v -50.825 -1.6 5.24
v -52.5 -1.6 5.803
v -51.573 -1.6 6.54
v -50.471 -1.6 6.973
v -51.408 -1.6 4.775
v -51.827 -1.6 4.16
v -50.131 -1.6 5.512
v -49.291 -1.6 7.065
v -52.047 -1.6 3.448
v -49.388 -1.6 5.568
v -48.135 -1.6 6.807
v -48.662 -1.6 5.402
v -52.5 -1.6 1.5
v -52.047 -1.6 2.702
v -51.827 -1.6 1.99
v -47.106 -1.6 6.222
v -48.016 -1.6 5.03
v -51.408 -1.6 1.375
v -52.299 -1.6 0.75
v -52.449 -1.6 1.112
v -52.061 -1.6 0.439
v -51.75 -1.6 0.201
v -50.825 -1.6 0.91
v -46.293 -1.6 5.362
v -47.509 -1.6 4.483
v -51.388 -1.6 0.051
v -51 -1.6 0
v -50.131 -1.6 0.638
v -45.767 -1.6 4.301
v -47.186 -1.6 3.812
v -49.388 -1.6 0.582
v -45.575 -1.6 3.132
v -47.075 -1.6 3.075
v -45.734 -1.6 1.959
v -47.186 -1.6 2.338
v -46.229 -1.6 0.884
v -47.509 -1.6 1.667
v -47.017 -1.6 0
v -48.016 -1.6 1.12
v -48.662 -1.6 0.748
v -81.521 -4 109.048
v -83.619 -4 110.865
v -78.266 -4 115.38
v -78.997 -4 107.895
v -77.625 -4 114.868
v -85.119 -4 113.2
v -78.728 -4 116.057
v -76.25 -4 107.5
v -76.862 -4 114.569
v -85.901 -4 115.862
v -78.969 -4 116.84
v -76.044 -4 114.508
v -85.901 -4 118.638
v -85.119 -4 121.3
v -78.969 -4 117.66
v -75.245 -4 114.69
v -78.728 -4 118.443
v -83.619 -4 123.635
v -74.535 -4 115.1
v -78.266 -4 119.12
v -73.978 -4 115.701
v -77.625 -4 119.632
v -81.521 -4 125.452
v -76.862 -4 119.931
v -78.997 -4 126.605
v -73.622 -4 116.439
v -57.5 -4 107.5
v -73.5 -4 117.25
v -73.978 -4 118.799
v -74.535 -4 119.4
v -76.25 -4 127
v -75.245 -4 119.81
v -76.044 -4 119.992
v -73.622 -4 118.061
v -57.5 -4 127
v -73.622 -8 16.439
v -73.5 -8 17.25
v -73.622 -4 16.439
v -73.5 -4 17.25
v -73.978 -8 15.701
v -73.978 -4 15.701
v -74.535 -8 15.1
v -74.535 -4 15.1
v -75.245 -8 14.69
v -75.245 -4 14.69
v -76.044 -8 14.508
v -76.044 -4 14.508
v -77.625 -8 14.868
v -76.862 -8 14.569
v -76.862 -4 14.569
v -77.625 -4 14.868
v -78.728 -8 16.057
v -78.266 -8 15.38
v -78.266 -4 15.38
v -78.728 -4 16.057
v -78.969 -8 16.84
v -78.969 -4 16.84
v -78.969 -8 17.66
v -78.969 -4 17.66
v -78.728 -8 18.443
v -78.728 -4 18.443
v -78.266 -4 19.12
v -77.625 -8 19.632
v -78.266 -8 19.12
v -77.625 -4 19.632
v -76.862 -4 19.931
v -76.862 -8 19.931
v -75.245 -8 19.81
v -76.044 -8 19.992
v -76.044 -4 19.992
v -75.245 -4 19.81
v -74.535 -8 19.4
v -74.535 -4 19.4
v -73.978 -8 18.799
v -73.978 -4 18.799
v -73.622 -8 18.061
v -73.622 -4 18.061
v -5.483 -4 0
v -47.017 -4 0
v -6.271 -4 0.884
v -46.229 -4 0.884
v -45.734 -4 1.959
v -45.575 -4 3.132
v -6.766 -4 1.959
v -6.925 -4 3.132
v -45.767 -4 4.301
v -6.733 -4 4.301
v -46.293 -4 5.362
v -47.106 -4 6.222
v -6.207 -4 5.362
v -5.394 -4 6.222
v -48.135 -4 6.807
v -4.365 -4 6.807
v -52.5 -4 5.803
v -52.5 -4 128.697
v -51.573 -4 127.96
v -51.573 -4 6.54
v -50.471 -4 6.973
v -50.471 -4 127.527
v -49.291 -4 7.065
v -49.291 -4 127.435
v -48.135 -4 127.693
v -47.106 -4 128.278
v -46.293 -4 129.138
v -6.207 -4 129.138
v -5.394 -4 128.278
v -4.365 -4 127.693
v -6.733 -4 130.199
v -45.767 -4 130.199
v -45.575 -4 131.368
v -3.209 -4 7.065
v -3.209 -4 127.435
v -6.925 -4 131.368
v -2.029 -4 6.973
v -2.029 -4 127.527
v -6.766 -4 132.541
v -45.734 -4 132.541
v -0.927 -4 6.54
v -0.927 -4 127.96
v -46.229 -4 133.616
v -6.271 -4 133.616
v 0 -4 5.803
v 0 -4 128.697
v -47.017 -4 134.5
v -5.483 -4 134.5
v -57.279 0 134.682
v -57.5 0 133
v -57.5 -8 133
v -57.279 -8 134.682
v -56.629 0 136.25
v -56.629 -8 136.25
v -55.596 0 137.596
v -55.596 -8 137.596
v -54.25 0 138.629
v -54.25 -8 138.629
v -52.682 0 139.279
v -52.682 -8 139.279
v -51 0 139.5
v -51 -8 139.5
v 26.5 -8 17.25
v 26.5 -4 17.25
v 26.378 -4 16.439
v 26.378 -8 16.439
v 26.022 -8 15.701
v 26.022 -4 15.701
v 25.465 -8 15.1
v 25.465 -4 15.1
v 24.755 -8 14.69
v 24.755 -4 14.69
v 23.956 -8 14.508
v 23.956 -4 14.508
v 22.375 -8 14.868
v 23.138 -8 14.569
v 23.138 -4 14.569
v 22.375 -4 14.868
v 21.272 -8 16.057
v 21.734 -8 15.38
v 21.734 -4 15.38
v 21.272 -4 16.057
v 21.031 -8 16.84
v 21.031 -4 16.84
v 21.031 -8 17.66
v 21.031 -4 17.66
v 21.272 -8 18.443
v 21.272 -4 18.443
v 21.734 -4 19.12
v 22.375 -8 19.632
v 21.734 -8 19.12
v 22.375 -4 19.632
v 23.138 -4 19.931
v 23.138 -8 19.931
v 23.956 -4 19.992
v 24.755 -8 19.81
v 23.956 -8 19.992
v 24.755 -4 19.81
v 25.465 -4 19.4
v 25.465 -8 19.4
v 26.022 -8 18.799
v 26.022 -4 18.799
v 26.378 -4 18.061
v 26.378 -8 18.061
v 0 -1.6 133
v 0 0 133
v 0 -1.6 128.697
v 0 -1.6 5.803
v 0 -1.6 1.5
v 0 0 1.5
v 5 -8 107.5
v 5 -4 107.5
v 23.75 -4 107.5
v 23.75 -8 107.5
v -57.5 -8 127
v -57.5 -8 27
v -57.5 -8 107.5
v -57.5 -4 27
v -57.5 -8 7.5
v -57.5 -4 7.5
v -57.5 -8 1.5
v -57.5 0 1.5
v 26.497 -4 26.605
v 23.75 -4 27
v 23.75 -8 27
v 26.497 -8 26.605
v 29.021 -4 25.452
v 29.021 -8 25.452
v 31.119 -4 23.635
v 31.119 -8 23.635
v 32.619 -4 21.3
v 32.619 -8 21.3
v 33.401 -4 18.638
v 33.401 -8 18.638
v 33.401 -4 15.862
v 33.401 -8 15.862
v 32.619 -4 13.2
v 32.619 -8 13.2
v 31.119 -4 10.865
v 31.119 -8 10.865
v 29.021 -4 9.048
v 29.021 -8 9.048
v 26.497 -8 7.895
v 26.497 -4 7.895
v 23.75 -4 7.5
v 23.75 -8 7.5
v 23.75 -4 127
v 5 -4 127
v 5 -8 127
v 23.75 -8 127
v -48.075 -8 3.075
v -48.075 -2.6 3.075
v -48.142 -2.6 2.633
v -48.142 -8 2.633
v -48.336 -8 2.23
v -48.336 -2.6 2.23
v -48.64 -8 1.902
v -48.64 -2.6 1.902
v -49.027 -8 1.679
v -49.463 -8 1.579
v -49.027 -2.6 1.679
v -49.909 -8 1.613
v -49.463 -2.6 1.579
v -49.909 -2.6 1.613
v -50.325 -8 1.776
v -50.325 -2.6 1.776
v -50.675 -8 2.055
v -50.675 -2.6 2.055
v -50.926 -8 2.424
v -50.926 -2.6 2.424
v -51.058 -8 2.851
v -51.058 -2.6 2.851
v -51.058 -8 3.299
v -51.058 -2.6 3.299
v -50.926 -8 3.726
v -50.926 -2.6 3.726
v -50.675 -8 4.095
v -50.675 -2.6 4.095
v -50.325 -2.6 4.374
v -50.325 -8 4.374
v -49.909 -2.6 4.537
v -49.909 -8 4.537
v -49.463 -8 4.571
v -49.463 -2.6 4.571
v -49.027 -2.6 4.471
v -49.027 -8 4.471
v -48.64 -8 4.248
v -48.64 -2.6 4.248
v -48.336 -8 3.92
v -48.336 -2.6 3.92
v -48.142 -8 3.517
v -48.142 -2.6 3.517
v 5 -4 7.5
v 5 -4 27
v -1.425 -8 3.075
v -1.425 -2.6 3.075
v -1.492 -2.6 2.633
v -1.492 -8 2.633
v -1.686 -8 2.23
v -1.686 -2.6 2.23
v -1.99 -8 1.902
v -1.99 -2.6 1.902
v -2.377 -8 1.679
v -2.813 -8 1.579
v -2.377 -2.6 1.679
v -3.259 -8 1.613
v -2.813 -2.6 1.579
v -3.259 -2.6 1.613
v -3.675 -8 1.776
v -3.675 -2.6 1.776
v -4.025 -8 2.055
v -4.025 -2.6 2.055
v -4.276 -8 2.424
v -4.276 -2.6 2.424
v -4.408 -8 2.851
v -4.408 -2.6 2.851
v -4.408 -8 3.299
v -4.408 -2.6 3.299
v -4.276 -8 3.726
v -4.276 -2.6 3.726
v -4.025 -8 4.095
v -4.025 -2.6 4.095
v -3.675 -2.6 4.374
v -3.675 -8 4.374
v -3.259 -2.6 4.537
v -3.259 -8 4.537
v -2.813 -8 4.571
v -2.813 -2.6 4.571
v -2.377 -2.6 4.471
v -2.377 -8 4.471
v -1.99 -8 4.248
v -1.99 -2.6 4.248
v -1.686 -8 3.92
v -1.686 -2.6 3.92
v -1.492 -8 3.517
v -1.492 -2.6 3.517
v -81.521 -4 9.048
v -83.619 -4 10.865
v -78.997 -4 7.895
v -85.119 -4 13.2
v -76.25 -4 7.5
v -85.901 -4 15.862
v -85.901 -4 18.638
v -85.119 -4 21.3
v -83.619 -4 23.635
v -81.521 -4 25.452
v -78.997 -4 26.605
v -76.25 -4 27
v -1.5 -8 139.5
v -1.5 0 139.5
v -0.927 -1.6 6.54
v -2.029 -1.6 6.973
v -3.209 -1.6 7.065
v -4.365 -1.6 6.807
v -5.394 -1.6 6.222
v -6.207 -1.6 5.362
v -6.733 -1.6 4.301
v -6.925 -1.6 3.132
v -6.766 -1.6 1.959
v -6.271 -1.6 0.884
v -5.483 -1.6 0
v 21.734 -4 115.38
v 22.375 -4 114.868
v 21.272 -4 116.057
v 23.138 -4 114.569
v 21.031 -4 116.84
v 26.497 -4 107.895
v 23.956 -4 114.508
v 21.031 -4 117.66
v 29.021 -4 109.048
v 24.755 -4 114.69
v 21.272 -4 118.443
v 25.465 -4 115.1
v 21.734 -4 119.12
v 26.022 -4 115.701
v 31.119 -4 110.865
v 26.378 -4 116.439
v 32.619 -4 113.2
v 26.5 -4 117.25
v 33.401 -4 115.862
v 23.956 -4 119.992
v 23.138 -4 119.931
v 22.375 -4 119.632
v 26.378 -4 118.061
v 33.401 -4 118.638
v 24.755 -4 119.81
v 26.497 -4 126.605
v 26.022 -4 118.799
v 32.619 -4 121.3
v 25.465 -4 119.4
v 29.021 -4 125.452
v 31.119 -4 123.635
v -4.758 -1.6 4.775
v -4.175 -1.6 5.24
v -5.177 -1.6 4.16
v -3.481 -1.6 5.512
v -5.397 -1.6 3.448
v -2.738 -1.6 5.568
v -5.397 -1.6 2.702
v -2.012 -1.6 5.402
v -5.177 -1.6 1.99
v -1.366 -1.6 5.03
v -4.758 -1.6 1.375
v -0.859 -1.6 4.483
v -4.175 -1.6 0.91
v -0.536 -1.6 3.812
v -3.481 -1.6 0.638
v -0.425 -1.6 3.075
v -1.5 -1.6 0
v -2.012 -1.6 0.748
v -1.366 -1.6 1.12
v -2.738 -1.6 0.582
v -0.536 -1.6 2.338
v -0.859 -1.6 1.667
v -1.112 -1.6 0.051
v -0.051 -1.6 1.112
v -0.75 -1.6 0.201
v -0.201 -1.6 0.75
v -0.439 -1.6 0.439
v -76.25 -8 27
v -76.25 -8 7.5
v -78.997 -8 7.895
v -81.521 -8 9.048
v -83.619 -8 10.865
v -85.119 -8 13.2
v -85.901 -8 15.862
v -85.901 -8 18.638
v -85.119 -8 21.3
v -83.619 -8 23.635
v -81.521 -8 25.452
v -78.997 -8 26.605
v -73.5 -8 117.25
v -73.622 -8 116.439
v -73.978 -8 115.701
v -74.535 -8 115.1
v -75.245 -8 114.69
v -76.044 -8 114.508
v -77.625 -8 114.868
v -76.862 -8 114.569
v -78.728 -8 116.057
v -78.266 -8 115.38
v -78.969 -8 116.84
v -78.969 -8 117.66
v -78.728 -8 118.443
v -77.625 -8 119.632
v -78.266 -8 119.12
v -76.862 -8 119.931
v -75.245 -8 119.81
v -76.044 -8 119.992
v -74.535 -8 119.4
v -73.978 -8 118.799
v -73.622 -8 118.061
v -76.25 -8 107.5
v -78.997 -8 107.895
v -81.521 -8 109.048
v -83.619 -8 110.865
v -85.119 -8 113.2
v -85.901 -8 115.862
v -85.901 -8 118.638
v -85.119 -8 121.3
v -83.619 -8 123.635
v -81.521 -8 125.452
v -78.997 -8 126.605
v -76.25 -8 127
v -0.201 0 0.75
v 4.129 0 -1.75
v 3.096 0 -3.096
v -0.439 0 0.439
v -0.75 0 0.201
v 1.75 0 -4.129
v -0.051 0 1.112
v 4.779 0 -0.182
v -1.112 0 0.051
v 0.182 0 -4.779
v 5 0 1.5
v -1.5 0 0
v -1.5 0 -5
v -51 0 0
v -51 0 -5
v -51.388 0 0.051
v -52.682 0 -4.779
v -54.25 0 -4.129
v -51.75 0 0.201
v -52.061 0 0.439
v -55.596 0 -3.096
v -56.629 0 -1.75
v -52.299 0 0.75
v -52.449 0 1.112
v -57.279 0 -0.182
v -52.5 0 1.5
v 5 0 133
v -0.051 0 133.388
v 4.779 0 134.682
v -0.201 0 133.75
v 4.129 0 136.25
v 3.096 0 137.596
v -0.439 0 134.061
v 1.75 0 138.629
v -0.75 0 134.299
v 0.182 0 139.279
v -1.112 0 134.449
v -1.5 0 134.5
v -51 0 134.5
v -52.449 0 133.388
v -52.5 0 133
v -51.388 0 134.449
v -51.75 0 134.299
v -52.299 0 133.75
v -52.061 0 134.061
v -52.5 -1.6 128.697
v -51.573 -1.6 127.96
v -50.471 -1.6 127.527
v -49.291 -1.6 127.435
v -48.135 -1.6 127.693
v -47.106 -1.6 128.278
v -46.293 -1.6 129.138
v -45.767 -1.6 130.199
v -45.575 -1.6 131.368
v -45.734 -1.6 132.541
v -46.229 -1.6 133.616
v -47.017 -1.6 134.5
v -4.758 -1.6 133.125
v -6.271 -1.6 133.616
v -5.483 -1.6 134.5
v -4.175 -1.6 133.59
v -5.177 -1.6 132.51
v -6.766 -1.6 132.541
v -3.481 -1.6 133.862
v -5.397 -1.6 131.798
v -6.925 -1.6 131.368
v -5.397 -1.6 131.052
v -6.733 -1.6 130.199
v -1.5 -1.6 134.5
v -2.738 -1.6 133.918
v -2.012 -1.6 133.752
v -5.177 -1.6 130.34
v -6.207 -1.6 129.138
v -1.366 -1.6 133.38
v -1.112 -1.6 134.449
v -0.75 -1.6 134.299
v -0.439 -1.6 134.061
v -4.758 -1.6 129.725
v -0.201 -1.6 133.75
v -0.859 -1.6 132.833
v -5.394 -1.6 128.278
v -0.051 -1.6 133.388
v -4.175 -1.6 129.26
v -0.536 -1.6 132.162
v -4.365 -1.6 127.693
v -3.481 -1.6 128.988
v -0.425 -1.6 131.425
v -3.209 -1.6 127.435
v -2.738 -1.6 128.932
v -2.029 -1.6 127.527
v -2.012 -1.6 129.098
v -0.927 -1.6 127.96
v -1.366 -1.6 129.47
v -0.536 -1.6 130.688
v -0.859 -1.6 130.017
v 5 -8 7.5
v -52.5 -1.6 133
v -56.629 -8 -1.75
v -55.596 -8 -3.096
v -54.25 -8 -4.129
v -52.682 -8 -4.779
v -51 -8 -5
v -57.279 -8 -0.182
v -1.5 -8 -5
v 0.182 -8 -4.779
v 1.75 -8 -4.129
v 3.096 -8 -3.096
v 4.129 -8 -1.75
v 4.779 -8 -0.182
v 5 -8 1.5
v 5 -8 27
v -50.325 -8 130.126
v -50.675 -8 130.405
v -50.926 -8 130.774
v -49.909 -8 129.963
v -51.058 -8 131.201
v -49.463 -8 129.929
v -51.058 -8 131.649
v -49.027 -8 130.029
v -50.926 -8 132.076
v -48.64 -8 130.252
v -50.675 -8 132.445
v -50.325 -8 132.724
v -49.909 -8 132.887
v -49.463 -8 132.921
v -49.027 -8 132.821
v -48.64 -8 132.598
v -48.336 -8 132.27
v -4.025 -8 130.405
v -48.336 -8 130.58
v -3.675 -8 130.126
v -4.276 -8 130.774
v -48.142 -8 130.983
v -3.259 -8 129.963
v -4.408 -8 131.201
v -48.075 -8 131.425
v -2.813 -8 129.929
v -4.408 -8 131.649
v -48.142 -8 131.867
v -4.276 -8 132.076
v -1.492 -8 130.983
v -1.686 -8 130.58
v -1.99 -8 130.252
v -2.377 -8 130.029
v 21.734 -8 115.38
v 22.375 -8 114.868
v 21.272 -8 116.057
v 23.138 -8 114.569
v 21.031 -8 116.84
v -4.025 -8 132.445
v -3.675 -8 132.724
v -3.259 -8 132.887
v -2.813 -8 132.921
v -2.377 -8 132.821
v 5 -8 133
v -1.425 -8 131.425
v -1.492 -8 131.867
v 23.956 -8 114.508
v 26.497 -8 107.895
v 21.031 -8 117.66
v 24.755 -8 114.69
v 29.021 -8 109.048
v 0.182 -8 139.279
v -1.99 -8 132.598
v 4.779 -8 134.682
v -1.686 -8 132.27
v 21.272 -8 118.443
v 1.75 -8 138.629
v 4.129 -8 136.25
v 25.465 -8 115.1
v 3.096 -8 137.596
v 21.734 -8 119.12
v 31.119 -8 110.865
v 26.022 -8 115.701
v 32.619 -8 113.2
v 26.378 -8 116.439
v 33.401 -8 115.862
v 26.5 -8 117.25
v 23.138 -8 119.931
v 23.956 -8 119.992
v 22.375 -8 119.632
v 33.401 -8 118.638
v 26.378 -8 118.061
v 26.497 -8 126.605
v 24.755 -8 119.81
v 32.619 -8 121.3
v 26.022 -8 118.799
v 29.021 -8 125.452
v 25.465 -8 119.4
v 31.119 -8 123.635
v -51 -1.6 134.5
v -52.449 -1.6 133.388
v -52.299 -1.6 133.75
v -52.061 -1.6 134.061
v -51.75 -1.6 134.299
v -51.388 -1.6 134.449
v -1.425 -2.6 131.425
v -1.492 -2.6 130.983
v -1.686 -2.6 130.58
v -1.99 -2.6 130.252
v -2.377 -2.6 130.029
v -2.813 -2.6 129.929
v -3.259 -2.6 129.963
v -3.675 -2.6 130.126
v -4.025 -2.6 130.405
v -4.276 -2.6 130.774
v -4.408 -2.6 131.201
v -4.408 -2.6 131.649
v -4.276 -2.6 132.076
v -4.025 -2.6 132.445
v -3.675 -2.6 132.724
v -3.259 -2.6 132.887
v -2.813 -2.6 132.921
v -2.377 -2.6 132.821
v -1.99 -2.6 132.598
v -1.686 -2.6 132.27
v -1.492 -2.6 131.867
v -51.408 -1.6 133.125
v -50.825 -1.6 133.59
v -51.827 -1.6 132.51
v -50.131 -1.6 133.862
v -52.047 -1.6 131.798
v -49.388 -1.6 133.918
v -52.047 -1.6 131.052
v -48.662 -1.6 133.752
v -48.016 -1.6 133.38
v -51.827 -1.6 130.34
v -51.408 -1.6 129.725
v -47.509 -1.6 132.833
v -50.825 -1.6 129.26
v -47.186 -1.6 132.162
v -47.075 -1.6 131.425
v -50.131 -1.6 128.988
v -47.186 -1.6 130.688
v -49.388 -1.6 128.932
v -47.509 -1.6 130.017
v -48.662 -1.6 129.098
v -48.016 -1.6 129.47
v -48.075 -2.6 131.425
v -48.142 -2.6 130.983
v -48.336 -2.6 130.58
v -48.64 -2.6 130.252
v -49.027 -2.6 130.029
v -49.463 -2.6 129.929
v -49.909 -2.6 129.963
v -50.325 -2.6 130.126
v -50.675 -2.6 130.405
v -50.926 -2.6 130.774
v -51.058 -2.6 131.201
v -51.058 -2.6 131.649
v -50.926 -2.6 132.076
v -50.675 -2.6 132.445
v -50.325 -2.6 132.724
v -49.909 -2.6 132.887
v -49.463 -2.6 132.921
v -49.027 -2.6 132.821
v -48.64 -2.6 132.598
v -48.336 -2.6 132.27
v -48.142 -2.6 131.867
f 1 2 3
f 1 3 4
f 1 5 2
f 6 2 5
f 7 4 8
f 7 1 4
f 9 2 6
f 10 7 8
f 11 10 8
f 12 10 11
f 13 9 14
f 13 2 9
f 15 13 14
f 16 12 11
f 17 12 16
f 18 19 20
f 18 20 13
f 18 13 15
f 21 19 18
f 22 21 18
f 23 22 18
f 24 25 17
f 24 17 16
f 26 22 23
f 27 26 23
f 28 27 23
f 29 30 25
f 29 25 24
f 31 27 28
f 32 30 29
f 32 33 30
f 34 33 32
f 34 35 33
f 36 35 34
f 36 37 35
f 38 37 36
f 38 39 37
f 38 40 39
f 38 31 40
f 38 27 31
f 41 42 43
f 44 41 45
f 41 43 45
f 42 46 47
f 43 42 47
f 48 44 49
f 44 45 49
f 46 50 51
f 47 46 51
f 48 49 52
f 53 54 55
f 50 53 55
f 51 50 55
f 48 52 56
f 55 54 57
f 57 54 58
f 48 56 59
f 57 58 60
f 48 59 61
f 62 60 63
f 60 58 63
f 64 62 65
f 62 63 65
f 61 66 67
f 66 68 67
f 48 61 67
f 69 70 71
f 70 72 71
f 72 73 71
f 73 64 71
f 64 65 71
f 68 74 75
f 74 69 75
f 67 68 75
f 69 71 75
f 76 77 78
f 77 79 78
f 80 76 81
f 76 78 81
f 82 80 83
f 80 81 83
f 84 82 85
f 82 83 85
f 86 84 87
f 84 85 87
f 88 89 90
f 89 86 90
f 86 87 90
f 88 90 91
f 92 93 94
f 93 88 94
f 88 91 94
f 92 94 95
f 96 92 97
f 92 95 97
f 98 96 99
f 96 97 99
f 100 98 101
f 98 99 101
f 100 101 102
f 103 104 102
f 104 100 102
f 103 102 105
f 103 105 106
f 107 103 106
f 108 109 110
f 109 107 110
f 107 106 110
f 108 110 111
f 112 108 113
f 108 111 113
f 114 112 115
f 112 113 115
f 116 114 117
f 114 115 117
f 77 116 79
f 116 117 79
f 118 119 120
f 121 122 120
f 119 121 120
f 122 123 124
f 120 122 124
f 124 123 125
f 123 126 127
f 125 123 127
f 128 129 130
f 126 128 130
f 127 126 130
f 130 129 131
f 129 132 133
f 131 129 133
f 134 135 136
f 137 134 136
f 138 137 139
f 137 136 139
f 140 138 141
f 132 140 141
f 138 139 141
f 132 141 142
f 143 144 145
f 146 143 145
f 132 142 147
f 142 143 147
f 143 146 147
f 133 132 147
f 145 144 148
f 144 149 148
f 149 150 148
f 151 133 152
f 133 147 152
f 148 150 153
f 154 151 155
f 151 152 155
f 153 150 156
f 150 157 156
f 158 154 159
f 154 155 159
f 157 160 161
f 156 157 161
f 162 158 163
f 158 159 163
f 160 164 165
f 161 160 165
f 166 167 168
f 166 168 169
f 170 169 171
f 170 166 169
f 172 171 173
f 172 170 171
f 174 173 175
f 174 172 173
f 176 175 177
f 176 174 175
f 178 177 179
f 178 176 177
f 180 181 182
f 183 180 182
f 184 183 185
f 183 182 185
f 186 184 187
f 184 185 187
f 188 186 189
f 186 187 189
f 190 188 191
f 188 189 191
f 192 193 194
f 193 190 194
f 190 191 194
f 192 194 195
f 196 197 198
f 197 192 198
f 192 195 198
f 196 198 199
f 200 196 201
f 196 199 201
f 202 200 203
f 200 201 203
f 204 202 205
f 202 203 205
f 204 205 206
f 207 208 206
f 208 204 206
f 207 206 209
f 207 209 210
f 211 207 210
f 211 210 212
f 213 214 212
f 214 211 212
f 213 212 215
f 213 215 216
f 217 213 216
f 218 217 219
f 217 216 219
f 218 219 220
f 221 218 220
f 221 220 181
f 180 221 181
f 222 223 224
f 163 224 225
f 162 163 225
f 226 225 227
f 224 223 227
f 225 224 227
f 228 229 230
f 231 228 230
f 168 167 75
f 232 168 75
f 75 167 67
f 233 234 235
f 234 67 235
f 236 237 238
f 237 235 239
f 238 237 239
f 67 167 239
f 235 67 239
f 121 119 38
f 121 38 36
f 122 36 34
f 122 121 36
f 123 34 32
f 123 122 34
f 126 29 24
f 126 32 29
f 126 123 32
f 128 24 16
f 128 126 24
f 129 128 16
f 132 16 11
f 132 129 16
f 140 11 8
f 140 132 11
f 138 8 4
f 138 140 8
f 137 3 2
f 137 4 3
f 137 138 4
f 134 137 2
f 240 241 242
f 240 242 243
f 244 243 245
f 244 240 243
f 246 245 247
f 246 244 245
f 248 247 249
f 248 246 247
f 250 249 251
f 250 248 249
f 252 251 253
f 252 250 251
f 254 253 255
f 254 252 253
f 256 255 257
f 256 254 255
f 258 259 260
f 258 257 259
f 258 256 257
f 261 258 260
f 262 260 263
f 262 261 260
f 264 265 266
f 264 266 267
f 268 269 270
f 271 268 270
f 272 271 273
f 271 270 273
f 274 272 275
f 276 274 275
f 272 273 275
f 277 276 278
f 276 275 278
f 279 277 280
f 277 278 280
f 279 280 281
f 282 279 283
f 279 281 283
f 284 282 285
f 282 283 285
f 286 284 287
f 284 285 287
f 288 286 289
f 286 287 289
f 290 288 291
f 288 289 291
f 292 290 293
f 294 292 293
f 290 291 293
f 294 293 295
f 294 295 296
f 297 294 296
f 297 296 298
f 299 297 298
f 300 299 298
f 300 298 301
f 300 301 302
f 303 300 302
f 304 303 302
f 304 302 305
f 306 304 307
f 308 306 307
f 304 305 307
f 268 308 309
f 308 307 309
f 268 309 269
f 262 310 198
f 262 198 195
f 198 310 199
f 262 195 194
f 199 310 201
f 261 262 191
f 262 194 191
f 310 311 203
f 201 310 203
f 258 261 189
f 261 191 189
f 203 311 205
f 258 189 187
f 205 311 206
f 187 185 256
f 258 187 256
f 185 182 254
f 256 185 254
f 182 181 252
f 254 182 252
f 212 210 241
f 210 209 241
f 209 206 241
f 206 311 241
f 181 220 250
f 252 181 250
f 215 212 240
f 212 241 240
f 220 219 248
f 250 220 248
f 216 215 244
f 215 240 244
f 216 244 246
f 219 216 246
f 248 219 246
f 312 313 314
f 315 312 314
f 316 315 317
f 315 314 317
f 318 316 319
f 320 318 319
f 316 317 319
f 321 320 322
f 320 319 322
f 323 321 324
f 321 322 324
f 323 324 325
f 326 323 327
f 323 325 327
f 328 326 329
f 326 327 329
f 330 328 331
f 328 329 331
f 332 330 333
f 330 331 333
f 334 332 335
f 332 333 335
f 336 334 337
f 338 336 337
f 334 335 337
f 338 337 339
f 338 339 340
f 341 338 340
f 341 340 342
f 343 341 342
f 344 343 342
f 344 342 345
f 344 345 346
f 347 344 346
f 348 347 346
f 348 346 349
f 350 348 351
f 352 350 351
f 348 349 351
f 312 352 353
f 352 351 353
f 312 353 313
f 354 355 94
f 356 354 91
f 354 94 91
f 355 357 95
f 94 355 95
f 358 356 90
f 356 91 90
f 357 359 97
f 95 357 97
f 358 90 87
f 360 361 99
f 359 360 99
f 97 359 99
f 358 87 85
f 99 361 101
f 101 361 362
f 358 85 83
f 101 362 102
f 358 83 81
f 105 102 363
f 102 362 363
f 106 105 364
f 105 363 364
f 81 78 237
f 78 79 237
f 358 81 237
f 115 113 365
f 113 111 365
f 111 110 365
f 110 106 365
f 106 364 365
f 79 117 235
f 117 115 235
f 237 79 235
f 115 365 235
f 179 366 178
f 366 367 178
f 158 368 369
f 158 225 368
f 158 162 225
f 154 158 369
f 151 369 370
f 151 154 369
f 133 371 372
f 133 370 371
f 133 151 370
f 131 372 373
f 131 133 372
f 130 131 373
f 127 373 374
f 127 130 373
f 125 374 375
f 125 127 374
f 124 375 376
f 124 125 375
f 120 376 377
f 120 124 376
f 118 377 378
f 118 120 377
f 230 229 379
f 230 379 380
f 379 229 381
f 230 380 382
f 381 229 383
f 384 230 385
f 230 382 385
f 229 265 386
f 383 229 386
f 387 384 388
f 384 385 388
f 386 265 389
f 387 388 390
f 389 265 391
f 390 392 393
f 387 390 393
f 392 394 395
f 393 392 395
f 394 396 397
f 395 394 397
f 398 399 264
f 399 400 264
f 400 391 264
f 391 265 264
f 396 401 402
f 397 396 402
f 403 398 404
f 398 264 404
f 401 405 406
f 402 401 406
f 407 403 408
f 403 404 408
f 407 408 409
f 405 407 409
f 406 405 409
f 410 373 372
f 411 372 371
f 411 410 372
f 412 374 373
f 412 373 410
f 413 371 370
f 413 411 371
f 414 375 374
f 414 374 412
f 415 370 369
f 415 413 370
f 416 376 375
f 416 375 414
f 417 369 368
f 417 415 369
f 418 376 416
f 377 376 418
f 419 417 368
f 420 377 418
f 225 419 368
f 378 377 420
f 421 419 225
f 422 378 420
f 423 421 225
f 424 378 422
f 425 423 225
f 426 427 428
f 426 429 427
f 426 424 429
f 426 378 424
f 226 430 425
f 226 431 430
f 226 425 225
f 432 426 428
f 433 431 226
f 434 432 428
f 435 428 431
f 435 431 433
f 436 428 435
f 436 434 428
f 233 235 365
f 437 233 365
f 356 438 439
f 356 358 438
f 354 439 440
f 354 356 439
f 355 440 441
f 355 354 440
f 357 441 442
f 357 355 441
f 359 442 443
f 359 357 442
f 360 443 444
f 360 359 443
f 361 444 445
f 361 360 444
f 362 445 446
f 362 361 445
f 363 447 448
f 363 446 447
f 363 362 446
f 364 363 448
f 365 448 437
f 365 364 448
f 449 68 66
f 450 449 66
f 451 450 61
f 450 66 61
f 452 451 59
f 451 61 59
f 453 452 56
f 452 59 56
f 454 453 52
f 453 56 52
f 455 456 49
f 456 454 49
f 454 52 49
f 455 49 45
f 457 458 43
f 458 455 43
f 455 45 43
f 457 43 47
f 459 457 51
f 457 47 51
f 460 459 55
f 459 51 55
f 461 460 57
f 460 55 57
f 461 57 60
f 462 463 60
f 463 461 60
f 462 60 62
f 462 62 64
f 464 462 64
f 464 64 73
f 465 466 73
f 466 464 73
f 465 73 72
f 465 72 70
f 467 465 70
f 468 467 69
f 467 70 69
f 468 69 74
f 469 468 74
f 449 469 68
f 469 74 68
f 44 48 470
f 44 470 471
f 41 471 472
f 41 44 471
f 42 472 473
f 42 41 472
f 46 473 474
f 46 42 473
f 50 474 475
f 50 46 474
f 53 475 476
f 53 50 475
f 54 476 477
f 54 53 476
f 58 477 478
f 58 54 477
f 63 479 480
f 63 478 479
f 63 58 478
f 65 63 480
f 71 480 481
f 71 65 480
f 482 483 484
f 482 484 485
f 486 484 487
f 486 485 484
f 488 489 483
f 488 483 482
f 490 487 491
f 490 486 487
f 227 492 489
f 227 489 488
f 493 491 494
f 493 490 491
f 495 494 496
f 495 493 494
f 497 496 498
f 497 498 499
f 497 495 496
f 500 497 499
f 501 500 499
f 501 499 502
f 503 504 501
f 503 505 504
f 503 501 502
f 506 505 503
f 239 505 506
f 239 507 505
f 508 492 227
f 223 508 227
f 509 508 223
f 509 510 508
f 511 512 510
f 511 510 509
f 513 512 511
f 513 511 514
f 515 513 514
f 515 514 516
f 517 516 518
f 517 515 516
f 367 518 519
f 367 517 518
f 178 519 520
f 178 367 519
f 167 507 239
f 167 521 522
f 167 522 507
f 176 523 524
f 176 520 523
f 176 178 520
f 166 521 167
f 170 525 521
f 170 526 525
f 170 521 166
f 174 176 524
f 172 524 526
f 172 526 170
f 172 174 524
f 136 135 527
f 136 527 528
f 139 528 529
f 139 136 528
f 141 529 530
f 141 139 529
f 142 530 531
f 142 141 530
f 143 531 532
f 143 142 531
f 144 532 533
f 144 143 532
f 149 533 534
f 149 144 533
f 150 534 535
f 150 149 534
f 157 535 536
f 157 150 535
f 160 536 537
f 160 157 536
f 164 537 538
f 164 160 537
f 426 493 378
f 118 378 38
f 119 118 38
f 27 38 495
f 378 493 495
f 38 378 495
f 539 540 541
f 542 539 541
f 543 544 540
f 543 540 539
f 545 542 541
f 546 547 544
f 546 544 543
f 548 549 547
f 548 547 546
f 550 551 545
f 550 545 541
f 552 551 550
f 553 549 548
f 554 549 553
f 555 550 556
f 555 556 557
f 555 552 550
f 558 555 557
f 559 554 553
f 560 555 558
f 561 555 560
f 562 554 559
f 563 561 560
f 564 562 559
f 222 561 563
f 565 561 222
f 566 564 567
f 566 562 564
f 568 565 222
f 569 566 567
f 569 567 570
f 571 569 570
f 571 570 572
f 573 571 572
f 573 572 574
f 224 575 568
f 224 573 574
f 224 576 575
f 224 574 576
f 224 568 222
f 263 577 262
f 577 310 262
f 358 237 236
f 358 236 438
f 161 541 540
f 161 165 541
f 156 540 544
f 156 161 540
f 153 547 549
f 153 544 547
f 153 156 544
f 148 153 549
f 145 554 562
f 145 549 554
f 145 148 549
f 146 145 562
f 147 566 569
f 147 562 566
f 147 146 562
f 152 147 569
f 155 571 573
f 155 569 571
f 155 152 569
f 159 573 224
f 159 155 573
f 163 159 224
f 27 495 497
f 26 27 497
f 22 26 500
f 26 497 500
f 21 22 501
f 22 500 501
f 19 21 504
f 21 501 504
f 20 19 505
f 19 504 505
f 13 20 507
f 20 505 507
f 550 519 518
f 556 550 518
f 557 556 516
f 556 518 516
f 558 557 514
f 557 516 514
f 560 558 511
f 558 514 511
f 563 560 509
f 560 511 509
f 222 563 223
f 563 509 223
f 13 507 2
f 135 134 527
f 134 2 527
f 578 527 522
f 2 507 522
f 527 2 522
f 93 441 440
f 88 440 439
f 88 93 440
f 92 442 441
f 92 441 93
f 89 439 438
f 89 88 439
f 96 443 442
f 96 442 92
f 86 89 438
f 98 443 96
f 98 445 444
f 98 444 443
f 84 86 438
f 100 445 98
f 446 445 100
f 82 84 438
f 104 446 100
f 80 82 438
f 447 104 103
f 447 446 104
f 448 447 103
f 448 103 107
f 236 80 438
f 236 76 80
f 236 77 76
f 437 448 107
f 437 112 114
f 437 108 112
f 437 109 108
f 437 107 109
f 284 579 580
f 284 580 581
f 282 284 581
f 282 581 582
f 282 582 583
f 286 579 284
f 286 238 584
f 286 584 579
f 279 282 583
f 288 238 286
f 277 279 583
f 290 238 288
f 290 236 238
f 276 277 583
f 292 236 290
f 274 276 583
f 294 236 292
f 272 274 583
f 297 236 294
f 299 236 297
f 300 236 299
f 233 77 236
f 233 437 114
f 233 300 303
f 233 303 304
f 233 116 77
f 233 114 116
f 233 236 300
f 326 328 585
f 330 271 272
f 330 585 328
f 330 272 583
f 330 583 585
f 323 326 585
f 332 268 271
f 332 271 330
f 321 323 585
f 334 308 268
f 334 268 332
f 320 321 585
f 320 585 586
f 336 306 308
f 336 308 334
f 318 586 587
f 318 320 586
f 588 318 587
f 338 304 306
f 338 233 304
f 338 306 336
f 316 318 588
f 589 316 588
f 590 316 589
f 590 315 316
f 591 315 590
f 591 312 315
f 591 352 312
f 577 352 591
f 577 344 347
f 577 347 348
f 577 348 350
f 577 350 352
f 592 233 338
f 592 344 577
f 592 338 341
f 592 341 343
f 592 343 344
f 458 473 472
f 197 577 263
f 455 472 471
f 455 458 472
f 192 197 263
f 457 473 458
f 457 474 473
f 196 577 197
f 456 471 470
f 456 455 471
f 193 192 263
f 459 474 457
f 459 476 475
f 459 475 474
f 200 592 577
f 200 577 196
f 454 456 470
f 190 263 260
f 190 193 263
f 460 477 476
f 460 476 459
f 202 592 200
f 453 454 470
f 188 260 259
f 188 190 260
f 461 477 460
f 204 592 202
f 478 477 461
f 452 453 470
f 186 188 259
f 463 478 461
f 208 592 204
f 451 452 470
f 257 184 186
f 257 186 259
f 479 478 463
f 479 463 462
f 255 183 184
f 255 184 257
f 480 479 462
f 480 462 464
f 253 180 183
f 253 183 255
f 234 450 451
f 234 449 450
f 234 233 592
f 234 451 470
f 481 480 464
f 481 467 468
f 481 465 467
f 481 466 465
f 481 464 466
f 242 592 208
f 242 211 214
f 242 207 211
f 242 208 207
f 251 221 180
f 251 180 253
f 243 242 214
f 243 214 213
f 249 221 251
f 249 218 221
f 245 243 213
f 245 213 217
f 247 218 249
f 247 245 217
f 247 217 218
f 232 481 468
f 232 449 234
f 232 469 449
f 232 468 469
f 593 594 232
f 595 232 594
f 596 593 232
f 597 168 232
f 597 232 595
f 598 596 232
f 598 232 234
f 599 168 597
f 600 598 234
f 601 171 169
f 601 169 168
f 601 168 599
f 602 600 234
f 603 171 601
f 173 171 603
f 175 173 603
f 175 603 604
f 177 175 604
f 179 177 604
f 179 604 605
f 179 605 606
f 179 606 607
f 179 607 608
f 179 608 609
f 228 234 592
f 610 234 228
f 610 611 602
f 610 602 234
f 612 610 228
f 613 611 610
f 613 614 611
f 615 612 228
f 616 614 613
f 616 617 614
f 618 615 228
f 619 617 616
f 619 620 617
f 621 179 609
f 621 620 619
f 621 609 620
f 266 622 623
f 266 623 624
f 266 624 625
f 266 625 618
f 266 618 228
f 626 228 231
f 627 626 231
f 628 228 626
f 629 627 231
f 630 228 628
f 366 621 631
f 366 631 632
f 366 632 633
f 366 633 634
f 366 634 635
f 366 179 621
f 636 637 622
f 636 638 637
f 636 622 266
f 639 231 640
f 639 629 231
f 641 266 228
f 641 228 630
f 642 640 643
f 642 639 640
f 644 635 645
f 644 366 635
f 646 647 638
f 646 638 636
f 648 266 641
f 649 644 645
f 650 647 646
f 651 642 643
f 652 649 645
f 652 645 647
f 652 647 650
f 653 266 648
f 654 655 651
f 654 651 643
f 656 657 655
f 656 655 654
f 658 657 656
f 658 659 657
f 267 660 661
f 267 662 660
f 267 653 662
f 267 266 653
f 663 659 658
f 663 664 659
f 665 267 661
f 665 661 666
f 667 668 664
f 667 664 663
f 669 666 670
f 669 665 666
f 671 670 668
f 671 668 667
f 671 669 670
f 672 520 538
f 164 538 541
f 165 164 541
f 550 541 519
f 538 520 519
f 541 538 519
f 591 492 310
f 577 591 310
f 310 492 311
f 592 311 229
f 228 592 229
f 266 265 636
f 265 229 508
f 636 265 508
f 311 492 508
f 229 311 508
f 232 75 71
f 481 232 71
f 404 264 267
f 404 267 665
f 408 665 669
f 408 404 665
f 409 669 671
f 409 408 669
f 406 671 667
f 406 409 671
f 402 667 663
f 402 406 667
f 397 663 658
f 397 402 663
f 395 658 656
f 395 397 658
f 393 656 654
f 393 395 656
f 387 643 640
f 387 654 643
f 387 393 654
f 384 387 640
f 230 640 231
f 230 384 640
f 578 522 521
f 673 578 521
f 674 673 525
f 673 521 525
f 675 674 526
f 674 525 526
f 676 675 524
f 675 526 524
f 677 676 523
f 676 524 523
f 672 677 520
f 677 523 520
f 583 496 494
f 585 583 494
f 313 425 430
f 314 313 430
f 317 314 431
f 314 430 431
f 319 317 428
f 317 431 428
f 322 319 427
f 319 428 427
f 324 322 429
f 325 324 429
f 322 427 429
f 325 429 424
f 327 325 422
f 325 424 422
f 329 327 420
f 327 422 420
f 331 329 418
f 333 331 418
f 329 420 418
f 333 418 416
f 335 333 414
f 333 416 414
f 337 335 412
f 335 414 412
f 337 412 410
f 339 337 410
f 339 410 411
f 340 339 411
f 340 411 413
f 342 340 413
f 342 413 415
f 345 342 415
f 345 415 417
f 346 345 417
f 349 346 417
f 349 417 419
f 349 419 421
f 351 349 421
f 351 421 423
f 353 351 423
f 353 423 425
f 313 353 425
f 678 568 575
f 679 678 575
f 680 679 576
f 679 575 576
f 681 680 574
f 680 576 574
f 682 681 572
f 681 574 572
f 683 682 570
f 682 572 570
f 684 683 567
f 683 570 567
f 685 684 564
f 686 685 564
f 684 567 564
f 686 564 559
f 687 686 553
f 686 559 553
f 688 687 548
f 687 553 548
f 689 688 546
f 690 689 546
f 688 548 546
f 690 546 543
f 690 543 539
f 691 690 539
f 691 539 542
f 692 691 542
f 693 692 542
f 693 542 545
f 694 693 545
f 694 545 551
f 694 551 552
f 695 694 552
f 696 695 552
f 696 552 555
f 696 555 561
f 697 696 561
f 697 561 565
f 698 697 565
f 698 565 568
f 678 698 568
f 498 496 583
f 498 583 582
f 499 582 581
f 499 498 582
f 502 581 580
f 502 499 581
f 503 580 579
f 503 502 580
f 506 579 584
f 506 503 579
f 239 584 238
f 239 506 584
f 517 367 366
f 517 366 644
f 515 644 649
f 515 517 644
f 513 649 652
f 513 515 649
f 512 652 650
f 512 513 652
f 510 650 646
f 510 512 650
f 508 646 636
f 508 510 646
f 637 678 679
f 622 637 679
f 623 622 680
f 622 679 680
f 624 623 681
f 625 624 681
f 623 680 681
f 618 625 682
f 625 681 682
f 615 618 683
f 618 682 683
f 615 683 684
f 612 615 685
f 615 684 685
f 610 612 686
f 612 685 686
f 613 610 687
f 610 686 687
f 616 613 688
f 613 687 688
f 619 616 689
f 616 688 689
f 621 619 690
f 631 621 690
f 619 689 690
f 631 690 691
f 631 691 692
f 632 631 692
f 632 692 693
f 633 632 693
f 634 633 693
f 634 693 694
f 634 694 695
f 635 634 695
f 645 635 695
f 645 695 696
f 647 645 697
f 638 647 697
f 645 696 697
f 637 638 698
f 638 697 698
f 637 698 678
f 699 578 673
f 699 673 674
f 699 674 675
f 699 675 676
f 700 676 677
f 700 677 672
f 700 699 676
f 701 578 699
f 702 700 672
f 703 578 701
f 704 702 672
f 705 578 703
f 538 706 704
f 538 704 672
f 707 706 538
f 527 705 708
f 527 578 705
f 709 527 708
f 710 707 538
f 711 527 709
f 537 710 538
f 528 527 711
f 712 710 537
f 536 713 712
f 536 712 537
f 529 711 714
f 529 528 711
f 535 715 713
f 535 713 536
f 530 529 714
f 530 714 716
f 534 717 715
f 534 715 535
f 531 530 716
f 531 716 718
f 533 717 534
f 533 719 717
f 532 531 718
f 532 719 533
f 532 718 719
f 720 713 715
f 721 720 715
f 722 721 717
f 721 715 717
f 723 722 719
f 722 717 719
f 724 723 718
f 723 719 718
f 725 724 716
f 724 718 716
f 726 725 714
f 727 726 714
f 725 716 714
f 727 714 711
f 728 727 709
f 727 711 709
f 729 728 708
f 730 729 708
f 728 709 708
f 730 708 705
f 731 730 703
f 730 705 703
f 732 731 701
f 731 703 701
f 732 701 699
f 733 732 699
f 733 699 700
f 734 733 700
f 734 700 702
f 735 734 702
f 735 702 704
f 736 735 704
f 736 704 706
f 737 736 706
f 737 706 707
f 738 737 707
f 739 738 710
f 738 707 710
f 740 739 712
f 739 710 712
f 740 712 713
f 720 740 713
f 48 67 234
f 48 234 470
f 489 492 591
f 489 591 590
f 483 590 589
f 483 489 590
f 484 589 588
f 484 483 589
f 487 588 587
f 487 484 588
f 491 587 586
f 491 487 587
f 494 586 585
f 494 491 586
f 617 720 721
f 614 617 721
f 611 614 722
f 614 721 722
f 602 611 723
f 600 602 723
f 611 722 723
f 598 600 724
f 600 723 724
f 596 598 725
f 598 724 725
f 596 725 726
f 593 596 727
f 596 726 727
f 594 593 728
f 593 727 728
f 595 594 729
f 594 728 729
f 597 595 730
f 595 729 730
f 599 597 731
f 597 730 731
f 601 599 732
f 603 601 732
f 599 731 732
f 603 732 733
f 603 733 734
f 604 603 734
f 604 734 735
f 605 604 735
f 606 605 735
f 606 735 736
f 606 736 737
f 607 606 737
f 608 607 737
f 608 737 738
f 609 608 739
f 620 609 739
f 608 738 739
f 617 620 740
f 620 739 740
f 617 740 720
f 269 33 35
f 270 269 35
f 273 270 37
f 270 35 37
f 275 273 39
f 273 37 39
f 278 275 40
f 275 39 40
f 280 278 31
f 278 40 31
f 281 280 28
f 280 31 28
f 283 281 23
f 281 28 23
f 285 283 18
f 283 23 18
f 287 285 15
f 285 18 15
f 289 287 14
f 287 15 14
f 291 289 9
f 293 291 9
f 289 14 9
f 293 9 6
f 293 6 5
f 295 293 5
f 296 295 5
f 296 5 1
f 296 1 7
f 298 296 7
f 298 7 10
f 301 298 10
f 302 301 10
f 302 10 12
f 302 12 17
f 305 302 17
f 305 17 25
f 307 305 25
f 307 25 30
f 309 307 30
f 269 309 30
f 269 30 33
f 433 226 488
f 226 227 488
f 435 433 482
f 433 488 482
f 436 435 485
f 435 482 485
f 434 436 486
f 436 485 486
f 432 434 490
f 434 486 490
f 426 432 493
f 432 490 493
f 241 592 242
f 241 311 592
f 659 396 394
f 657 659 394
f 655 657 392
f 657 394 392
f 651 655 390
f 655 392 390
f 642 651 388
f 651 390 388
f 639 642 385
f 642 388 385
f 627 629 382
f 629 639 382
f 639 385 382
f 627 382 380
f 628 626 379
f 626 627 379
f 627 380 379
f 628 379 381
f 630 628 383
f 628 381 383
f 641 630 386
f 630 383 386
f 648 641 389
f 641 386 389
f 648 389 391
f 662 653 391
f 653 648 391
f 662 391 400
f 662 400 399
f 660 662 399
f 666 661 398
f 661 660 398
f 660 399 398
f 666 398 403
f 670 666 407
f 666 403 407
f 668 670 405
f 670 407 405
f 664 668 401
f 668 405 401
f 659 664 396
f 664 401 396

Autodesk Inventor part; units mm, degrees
ref_plane "YZ Plane" through (0, 0, 0) normal (1, 0, 0) x (0, 1, 0)
ref_plane "XZ Plane" through (0, 0, 0) normal (0, 1, 0) x (-1, 0, 0)
ref_plane "XY Plane" through (0, 0, 0) normal (0, 0, 1) x (1, 0, 0)
sketch "Sketch1" plane through (0, 0, 0) normal (0, 1, 0) x (-1, 0, 0)
  line L0 (1.5, 0) -> (51, 0)
  line L1 (52.5, 1.5) -> (52.5, 133)
  line L2 (51, 134.5) -> (1.5, 134.5)
  line L3 (0, 133) -> (0, 1.5)
  arc A0 (52.5, 133) -> (51, 134.5) centre (51, 133) ccw
  arc A1 (51, 0) -> (52.5, 1.5) centre (51, 1.5) ccw
  arc A2 (0, 1.5) -> (1.5, 0) centre (1.5, 1.5) ccw
  arc A3 (1.5, 134.5) -> (0, 133) centre (1.5, 133) ccw
  line L4 (57.5, 133) -> (57.5, 1.5)
  arc A4 (51, -5) -> (57.5, 1.5) centre (51, 1.5) ccw
  line L5 (51, -5) -> (1.5, -5)
  arc A5 (-5, 1.5) -> (1.5, -5) centre (1.5, 1.5) ccw
  line L6 (-5, 1.5) -> (-5, 133)
  arc A6 (1.5, 139.5) -> (-5, 133) centre (1.5, 133) ccw
  line L7 (1.5, 139.5) -> (51, 139.5)
  arc A7 (57.5, 133) -> (51, 139.5) centre (51, 133) ccw
  point P0 (0, 0)
  point P1 (52.5, 134.5)
  point P2 (52.5, 0)
  point P3 (0, 134.5)
  dimension "d0" = 52.5
  dimension "d1" = 134.5
  dimension "d2" = 1.5
  dimension "d3" = 5
extrude "Extrusion1" add sketch "Sketch1" against normal blind 4
sketch "Sketch2" plane through (0, -4, 0) normal (0, -1, 0) x (1, 0, 0)
  line L0 (5, 1.5) -> (5, 133) projected
  arc A0 (5, 133) -> (-1.5, 139.5) centre (-1.5, 133) ccw projected
  line L1 (-1.5, 139.5) -> (-51, 139.5) projected
  arc A1 (-51, 139.5) -> (-57.5, 133) centre (-51, 133) ccw projected
  line L2 (-57.5, 133) -> (-57.5, 1.5) projected
  arc A2 (-57.5, 1.5) -> (-51, -5) centre (-51, 1.5) ccw projected
  line L3 (-51, -5) -> (-1.5, -5) projected
  arc A3 (-1.5, -5) -> (5, 1.5) centre (-1.5, 1.5) ccw projected
  arc A4 (-1.5, 0) -> (0, 1.5) centre (-1.5, 1.5) ccw projected
  line L4 (-1.5, 0) -> (-51, 0) projected
  arc A5 (-52.5, 1.5) -> (-51, 0) centre (-51, 1.5) ccw projected
  line L5 (-52.5, 1.5) -> (-52.5, 133) projected
  arc A6 (-51, 134.5) -> (-52.5, 133) centre (-51, 133) ccw projected
  line L6 (-51, 134.5) -> (-1.5, 134.5) projected
  arc A7 (0, 133) -> (-1.5, 134.5) centre (-1.5, 133) ccw projected
  line L7 (0, 133) -> (0, 1.5) projected
  line L8 (23.75, 117.25) -> (-76.25, 117.25) construction
  line L9 (-76.25, 117.25) -> (-76.25, 17.25) construction
  line L10 (-76.25, 17.25) -> (23.75, 17.25) construction
  line L11 (23.75, 17.25) -> (23.75, 117.25) construction
  circle A8 centre (23.75, 117.25) radius 2.75
  arc A9 (23.75, 107.5) -> (23.75, 127) centre (23.75, 117.25) ccw
  line L12 (5, 1.5) -> (5, 133) projected
  line L13 (5, 127) -> (23.75, 127)
  line L14 (5, 107.5) -> (23.75, 107.5)
  line L15 (23.75, 67.25) -> (-76.25, 67.25) construction
  line L16 (-26.25, 67.25) -> (-26.25, 117.25) construction
  circle A10 centre (23.75, 17.25) radius 2.75
  arc A11 (23.75, 7.5) -> (23.75, 27) centre (23.75, 17.25) ccw
  line L17 (5, 7.5) -> (23.75, 7.5)
  line L18 (5, 27) -> (23.75, 27)
  circle A12 centre (-76.25, 117.25) radius 2.75
  arc A13 (-76.25, 127) -> (-76.25, 107.5) centre (-76.25, 117.25) ccw
  line L19 (-57.5, 127) -> (-76.25, 127)
  line L20 (-57.5, 107.5) -> (-76.25, 107.5)
  arc A14 (-76.25, 27) -> (-76.25, 7.5) centre (-76.25, 17.25) ccw
  circle A15 centre (-76.25, 17.25) radius 2.75
  line L21 (-57.5, 7.5) -> (-76.25, 7.5)
  line L22 (-57.5, 27) -> (-76.25, 27)
  point P0 (0, 0)
  dimension "d6" = 100
  dimension "d7" = 100
  dimension "d8" = 62.5
  dimension "d9" = 144.5
  dimension "d10" = 18.75
  dimension "d11" = 22.25
  dimension "d12" = 5.5
  dimension "d13" = 7
extrude "Extrusion2" add sketch "Sketch2" along normal blind 4 contours A3 L3 A2 L2 A1 L1 A0 L0 | L0 L18 A11 L17 | L0 L13 A9 L14 | L21 A14 L22 L2 | L20 A13 L19 L2 | L4 A5 L5 A6 L6 A7 L7 A4
sketch "Sketch3" plane through (0, -4, 0) normal (0, 1, 0) x (1, 0, 0)
  line L0 (-49.575, -131.425) -> (-2.925, -131.425) construction
  line L1 (-2.925, -131.425) -> (-2.925, -3.075) construction
  line L2 (-2.925, -3.075) -> (-49.575, -3.075) construction
  line L3 (-49.575, -3.075) -> (-49.575, -131.425) construction
  line L4 (-49.575, -131.425) -> (-49.575, -134.5) construction
  line L5 (-1.5, -134.5) -> (-51, -134.5) construction
  line L6 (-49.575, -131.425) -> (-52.5, -131.425) construction
  line L7 (-52.5, -1.5) -> (-52.5, -133) construction
  line L8 (-2.925, -3.075) -> (0, -3.075) construction
  line L9 (0, -1.5) -> (0, -133) construction
  line L10 (-2.925, -3.075) -> (-2.925, 0) construction
  line L11 (-51, 0) -> (-1.5, 0) construction
  circle A0 centre (-49.575, -131.425) radius 4
  circle A1 centre (-2.925, -131.425) radius 4
  circle A2 centre (-2.925, -3.075) radius 4
  circle A3 centre (-49.575, -3.075) radius 4
  point P0 (0, 0)
  dimension "d16" = 46.65
  dimension "d17" = 128.35
  dimension "d18" = 8
  dimension "d19" = 8
  dimension "d20" = 8
  dimension "d21" = 8
extrude "Extrusion3" add sketch "Sketch3" along normal blind 2.4
sketch "Sketch4" plane through (0, -1.6, 0) normal (0, 1, 0) x (1, 0, 0)
  line L0 (-47.0168, -134.5) -> (-51, -134.5) projected
  arc A0 (-47.0168, -134.5) -> (-52.5, -128.6966) centre (-49.575, -131.425) ccw projected
  line L1 (-52.5, -133) -> (-52.5, -128.6966) projected
  arc A1 (-52.5, -133) -> (-51, -134.5) centre (-51, -133) ccw projected
  line L2 (0, -128.6966) -> (0, -133) projected
  arc A2 (0, -128.6966) -> (-5.4832, -134.5) centre (-2.925, -131.425) ccw projected
  line L3 (-1.5, -134.5) -> (-5.4832, -134.5) projected
  arc A3 (-1.5, -134.5) -> (0, -133) centre (-1.5, -133) ccw projected
  line L4 (-52.5, -5.8034) -> (-52.5, -1.5) projected
  arc A4 (-52.5, -5.8034) -> (-47.0168, 0) centre (-49.575, -3.075) ccw projected
  line L5 (-51, 0) -> (-47.0168, 0) projected
  arc A5 (-51, 0) -> (-52.5, -1.5) centre (-51, -1.5) ccw projected
  line L6 (-5.4832, 0) -> (-1.5, 0) projected
  arc A6 (-5.4832, 0) -> (0, -5.8034) centre (-2.925, -3.075) ccw projected
  line L7 (0, -1.5) -> (0, -5.8034) projected
  arc A7 (0, -1.5) -> (-1.5, 0) centre (-1.5, -1.5) ccw projected
  circle A8 centre (-49.575, -131.425) radius 1.5
  arc A9 (-52.5, -5.8034) -> (-47.0168, 0) centre (-49.575, -3.075) ccw projected
  circle A10 centre (-49.575, -3.075) radius 1.5
  circle A11 centre (-2.925, -3.075) radius 1.5
  arc A12 (0, -128.6966) -> (-5.4832, -134.5) centre (-2.925, -131.425) ccw projected
  circle A13 centre (-2.925, -131.425) radius 1.5
  point P0 (0, 0)
  dimension "d24" = 3
  dimension "d25" = 3
  dimension "d26" = 3
  dimension "d27" = 3
extrude "Extrusion4" cut sketch "Sketch4" against normal through all contours A8 | A10 | A11 | A13
chamfer "Chamfer1" distance 1 angle 45 4 edges at (-51.075, -1.6, 131.425) (-4.425, -1.6, 131.425) (-4.425, -1.6, 3.075) (-51.075, -1.6, 3.075)
equation "\"d10\" = -0.5 * d8 + 0.5 * d6"
equation "\"d11\" = -0.5 * d7 + 0.5 * d9"
equation "\"d19\" = d18"
equation "\"d20\" = d18"
equation "\"d21\" = d18"
equation "\"d25\" = d24"
equation "\"d26\" = d24"
equation "\"d27\" = d24"
properties part number "Elegoo 8 Channel Relay Module"
